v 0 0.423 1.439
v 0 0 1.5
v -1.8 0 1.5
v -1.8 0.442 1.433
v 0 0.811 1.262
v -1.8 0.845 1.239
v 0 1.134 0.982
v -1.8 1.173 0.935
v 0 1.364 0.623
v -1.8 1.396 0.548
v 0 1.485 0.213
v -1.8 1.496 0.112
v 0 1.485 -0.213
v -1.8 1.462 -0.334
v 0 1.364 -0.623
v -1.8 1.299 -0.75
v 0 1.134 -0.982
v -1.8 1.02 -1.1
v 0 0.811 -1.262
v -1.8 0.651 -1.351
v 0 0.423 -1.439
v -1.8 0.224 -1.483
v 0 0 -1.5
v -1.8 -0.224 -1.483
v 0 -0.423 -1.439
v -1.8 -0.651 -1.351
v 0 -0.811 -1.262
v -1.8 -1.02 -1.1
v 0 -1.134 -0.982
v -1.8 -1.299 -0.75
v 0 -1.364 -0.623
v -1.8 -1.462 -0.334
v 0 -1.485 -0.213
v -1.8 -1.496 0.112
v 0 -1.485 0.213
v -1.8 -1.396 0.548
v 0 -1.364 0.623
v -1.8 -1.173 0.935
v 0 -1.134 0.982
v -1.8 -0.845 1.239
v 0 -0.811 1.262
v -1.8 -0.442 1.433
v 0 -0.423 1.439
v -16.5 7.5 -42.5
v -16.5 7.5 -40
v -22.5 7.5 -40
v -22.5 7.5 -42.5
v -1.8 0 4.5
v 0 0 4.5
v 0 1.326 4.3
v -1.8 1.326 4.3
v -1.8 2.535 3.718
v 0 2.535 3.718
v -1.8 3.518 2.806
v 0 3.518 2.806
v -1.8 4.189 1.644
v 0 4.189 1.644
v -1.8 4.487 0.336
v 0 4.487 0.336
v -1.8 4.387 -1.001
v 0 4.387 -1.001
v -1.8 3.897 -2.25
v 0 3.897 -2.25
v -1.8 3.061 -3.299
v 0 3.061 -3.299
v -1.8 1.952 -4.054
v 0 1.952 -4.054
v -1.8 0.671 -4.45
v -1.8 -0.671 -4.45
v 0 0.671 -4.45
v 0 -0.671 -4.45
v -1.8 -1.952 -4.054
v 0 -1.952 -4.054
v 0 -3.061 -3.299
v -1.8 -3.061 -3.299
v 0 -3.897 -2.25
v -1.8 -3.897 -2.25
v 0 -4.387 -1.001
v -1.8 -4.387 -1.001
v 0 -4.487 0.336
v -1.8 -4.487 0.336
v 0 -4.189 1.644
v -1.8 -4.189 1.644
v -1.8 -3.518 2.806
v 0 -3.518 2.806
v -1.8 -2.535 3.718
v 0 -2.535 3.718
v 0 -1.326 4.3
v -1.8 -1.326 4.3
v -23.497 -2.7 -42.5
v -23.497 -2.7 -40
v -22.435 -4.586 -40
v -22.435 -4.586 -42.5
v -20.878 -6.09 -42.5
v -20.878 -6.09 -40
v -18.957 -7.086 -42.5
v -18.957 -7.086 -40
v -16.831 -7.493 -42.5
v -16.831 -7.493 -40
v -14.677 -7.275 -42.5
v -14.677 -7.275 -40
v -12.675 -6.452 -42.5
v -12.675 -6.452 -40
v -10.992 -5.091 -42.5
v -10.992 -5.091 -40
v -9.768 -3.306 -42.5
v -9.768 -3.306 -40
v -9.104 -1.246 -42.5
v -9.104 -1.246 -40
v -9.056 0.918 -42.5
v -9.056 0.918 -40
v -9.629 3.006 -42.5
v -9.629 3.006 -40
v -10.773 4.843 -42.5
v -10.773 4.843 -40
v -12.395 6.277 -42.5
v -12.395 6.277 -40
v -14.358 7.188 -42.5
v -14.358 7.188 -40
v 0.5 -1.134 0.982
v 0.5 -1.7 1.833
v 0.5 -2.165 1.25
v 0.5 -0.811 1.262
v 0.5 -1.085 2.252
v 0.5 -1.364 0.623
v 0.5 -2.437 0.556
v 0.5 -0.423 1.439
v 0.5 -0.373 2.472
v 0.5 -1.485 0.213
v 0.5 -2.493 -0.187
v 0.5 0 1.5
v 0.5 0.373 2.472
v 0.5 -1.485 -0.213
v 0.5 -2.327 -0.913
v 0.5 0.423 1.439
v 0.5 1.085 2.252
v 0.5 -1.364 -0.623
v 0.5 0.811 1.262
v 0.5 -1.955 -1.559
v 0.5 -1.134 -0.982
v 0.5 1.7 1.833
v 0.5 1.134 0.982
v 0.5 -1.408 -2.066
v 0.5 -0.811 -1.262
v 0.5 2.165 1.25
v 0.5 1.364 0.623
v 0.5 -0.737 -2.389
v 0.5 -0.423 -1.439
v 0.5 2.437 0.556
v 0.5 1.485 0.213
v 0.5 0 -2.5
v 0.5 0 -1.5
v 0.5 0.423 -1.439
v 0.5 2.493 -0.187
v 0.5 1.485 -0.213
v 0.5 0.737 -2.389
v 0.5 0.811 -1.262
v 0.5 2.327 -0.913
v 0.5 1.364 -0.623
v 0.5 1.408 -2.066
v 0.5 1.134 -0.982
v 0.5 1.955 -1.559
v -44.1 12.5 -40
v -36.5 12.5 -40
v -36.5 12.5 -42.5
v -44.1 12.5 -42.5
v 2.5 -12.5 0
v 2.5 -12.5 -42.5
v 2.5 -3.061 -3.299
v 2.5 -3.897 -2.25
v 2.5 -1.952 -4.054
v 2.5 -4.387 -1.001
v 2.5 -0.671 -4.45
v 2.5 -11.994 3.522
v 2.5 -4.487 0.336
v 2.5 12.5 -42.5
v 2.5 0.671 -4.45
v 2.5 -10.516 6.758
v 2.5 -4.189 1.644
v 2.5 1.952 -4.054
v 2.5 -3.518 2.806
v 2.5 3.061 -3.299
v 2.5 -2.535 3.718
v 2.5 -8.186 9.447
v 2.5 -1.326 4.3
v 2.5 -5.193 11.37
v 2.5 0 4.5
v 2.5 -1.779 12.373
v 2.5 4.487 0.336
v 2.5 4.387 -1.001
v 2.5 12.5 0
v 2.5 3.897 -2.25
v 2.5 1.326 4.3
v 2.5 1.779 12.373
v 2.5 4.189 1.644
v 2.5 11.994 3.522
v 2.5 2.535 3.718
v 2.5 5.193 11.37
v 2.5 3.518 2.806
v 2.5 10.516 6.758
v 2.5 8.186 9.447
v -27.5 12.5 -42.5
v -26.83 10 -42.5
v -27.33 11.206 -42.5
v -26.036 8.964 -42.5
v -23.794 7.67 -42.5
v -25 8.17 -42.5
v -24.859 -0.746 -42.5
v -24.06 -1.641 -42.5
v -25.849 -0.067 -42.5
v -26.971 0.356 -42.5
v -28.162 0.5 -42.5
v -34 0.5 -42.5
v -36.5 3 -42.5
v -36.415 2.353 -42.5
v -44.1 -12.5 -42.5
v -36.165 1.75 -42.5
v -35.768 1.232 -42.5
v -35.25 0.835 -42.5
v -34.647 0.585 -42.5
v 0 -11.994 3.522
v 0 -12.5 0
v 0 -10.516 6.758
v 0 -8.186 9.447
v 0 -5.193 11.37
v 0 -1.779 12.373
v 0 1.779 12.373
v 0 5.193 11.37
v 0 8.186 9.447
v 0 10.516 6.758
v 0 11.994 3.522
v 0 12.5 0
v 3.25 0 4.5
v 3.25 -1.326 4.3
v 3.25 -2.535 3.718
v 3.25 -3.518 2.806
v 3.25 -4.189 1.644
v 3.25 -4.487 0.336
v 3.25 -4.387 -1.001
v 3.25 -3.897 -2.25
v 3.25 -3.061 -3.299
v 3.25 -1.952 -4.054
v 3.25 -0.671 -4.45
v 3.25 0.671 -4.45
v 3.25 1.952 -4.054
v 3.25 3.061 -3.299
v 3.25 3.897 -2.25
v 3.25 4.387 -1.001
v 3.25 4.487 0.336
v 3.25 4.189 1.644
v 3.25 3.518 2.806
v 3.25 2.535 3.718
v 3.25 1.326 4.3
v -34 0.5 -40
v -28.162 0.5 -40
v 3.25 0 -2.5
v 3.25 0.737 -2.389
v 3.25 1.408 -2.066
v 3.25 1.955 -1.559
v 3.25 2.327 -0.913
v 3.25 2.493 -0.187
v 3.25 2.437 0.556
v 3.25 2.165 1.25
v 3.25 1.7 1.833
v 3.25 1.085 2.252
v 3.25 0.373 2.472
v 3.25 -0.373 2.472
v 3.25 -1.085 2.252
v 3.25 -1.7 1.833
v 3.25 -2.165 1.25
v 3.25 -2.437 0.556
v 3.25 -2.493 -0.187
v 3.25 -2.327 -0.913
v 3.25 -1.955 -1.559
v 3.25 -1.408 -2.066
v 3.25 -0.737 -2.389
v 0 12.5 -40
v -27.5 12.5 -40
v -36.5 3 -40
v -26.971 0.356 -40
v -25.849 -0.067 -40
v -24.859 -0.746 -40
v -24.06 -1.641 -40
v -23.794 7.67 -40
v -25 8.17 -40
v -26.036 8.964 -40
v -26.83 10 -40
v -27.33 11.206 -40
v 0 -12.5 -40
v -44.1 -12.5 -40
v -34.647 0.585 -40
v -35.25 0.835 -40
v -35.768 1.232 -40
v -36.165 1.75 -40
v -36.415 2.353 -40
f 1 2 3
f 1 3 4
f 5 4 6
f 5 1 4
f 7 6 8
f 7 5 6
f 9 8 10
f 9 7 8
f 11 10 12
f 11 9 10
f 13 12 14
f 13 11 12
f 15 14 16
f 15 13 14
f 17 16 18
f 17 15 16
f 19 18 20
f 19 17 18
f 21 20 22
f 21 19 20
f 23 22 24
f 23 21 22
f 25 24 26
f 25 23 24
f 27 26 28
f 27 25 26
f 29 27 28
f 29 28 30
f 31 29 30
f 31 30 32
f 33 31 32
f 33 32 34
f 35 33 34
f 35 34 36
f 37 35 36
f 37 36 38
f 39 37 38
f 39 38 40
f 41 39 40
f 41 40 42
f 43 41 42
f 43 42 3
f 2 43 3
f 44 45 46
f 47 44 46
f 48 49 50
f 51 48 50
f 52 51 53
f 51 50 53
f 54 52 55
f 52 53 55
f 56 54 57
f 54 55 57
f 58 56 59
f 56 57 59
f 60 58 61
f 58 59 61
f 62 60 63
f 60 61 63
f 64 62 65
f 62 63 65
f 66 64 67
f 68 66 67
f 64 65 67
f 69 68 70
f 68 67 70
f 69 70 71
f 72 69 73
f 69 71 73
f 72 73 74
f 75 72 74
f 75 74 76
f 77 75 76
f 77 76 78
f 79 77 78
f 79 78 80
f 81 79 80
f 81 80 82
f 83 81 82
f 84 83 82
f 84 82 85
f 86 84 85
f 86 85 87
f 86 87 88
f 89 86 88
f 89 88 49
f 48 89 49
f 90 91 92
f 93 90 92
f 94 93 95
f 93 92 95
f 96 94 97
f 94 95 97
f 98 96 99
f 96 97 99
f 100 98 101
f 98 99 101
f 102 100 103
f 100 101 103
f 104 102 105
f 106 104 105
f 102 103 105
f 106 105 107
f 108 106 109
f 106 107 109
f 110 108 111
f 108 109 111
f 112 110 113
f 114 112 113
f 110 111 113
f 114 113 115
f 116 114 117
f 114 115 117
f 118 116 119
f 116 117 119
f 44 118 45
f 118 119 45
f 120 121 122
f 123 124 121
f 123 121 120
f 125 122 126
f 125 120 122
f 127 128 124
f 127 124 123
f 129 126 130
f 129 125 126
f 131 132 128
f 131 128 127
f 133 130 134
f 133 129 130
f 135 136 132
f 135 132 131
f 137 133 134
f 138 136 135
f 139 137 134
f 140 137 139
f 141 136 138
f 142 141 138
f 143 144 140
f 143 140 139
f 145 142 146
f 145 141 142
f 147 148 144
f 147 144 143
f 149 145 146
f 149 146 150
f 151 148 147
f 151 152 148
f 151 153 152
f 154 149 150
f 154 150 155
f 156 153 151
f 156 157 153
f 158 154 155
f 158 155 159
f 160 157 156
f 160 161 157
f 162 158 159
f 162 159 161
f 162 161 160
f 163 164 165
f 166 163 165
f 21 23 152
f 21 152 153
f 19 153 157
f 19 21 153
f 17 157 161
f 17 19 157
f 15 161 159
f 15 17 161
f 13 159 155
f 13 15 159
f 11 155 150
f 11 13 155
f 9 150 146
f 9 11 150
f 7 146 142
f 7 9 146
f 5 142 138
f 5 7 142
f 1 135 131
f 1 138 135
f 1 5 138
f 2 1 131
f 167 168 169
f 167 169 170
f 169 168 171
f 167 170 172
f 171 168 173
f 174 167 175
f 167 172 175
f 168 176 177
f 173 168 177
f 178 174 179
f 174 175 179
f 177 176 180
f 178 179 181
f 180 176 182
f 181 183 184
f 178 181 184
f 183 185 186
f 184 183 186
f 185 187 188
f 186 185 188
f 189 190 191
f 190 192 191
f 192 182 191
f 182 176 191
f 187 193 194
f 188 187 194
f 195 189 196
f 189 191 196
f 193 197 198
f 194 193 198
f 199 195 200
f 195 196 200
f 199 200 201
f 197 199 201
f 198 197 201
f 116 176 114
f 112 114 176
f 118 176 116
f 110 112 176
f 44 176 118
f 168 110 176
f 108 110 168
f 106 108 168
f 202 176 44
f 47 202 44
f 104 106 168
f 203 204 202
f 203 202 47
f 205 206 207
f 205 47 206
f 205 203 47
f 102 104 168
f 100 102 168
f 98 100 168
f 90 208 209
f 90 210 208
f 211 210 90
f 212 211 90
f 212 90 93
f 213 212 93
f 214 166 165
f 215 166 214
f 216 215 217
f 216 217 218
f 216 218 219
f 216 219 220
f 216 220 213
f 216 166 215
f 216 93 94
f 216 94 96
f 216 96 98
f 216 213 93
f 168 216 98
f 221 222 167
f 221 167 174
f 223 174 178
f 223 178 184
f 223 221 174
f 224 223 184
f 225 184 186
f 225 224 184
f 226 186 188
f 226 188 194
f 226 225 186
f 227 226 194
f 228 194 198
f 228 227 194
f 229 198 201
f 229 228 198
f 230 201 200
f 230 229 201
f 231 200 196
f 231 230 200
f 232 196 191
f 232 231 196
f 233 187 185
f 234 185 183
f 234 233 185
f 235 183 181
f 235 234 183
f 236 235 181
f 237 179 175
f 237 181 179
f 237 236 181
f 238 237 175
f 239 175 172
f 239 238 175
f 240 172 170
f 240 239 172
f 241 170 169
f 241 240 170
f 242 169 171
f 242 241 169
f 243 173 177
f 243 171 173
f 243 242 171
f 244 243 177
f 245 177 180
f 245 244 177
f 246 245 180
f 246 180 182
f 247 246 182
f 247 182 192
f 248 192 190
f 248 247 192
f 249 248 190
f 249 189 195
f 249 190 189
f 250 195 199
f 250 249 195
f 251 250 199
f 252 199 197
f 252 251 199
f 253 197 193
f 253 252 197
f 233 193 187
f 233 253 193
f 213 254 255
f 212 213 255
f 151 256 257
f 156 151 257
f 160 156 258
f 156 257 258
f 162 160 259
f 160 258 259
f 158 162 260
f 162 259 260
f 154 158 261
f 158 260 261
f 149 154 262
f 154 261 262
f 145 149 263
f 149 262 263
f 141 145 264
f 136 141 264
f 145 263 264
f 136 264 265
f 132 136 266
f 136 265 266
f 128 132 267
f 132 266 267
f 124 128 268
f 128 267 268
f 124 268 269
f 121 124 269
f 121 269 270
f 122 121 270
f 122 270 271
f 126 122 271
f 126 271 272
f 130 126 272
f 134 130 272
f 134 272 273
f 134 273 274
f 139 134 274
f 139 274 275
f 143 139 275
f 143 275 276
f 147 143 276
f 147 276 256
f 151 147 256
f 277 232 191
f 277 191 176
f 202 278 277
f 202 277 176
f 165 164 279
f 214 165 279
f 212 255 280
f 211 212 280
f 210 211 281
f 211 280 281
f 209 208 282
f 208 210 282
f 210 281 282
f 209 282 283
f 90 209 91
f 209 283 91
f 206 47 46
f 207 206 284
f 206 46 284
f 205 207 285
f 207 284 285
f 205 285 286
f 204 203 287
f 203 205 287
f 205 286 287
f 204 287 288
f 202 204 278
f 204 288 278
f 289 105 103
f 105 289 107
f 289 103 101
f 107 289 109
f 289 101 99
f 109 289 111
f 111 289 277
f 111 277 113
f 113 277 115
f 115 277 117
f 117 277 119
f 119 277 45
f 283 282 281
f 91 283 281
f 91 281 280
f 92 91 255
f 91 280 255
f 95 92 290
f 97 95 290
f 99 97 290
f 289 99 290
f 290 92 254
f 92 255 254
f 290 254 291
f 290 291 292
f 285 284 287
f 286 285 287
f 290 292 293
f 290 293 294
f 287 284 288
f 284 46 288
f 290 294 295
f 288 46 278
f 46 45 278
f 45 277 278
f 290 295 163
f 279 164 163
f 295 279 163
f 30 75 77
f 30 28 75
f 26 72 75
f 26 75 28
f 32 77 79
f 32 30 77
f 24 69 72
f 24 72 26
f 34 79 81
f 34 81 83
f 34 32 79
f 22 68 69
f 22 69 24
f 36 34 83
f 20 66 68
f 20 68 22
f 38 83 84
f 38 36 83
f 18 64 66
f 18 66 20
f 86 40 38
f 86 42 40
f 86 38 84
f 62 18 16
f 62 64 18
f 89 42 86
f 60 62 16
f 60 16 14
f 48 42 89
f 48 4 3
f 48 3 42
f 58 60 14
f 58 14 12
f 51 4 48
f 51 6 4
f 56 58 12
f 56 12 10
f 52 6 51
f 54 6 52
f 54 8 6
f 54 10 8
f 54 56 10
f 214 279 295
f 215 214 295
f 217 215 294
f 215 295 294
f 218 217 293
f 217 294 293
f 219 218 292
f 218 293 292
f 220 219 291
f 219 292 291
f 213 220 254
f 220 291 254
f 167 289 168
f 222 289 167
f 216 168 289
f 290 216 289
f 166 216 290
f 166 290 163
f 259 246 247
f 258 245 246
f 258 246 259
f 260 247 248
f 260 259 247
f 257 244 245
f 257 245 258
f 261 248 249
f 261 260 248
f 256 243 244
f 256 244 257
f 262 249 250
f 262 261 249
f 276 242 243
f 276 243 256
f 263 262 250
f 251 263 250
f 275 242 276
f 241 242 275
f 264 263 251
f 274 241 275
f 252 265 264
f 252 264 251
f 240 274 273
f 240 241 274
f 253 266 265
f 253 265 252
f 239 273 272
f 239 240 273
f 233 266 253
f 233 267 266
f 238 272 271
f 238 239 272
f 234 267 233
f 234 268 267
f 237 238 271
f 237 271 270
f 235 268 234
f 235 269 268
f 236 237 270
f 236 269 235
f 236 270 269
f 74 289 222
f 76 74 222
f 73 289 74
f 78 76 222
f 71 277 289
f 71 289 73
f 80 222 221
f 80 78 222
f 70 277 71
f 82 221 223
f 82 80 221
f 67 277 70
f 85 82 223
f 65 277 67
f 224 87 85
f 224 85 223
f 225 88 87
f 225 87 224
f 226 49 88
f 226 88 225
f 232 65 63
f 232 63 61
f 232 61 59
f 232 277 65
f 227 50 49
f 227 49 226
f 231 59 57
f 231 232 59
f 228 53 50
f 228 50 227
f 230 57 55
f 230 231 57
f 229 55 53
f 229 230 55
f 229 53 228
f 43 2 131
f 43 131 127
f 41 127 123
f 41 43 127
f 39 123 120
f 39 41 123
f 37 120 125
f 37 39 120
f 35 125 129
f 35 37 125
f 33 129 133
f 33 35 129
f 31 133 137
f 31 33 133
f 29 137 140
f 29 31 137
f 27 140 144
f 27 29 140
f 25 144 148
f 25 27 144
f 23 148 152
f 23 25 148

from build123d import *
from build123d.topology import SkipClean

# Parameters (mm, degrees)
SKETCH1_R                = 1.5
BOSS_EXTRUDE1_DEPTH      = 2.5
BOSS_EXTRUDE2_DEPTH      = 1.8
BOSS_EXTRUDE2_DEPTH_BACK = 2.5
SKETCH2_R                = 4.5
SKETCH2_R_2              = 1.5
SKETCH4_R                = 2.5
CUT_EXTRUDE1_DEPTH       = 2
BOSS_EXTRUDE3_START      = 0.75
SKETCH5_R                = 4.5
SKETCH5_R_2              = 2.5
BOSS_EXTRUDE3_DEPTH      = 0.75
SKETCH6_W                = 46.6
SKETCH6_H                = 25
BOSS_EXTRUDE4_DEPTH      = 2.5
CUT_EXTRUDE2_REACH       = 71.694


with BuildPart() as part:
    # Sketch1 → Boss-Extrude1 (new body)
    with BuildSketch(Plane(origin=(0, 0, 0), x_dir=(0, 0, -1), z_dir=(1, 0, 0))):
        with BuildLine():
            Line((0, 12.5), (42.5, 12.5))
            Line((42.5, 12.5), (42.5, -12.5))
            Line((42.5, -12.5), (0, -12.5))
            ThreePointArc((0, -12.5), (-12.5, 0), (0, 12.5))
        make_face()
        Circle(SKETCH1_R, mode=Mode.SUBTRACT)
    extrude(amount=BOSS_EXTRUDE1_DEPTH)

    # Sketch2 → Boss-Extrude2 (add, two sides: drawn at the far end of the back side and taken through both)
    with BuildSketch(Plane.ZY.offset(-BOSS_EXTRUDE2_DEPTH_BACK)):
        Circle(SKETCH2_R)
        Circle(SKETCH2_R_2, mode=Mode.SUBTRACT)
    extrude(amount=BOSS_EXTRUDE2_DEPTH + BOSS_EXTRUDE2_DEPTH_BACK)

    # Sketch4 → Cut-Extrude1 (cut)
    with BuildSketch(Plane(origin=(2.5, 0, 0), x_dir=(0, 0, -1), z_dir=(1, 0, 0))):
        Circle(SKETCH4_R)
    extrude(amount=-CUT_EXTRUDE1_DEPTH, mode=Mode.SUBTRACT)

    # Sketch5 → Boss-Extrude3 (add)
    with SkipClean():  # the faces are left unmerged after this step: merging them gives an invalid solid
        with BuildSketch(Plane(origin=(2.5, 0, 0), x_dir=(0, 0, -1), z_dir=(1, 0, 0)).offset(BOSS_EXTRUDE3_START)):
            with Locations(Location((0, 0, 0), (0, 0, 180))):
                Circle(SKETCH5_R)
            Circle(SKETCH5_R_2, mode=Mode.SUBTRACT)
        extrude(amount=-BOSS_EXTRUDE3_DEPTH)

    # Sketch6 → Boss-Extrude4 (add)
    with SkipClean():  # the faces are left unmerged after this step: merging them gives an invalid solid
        with BuildSketch(Plane(origin=(0, 0, -42.5), x_dir=(-1, 0, 0), z_dir=(0, 0, -1))):
            with Locations((20.8, 0)):
                Rectangle(SKETCH6_W, SKETCH6_H)
        extrude(amount=-BOSS_EXTRUDE4_DEPTH)
    add(part.part.scale(1), mode=Mode.REPLACE)  # the faces are merged on a copy

    # Sketch7 → Cut-Extrude2 (cut, up to next)
    with BuildSketch(Plane.XY.offset(-40), mode=Mode.PRIVATE) as cut_extrude2_sk1:
        with BuildLine():
            Line((-27.5, 12.5), (-36.5, 12.5))
            Line((-36.5, 12.5), (-36.5, 3))
            ThreePointArc((-36.5, 3), (-35.767766953, 1.232233047), (-34, 0.5))
            Line((-34, 0.5), (-28.16190379, 0.5))
            ThreePointArc((-28.16190379, 0.5), (-25.333476665, -0.376894374), (-23.497142274, -2.7))
            ThreePointArc((-23.497142274, -2.7), (-10.315341562, -4.242640687), (-16.5, 7.5))
            Line((-16.5, 7.5), (-22.5, 7.5))
            ThreePointArc((-22.5, 7.5), (-26.035533906, 8.964466094), (-27.5, 12.5))
        make_face()
    cut_extrude2_tool1 = extrude(cut_extrude2_sk1.sketch, amount=-CUT_EXTRUDE2_REACH, mode=Mode.PRIVATE) & part.part
    add(cut_extrude2_tool1.solids().sort_by_distance((-22.661838, 2.786009, -40))[0], mode=Mode.SUBTRACT)


solid = part.part
